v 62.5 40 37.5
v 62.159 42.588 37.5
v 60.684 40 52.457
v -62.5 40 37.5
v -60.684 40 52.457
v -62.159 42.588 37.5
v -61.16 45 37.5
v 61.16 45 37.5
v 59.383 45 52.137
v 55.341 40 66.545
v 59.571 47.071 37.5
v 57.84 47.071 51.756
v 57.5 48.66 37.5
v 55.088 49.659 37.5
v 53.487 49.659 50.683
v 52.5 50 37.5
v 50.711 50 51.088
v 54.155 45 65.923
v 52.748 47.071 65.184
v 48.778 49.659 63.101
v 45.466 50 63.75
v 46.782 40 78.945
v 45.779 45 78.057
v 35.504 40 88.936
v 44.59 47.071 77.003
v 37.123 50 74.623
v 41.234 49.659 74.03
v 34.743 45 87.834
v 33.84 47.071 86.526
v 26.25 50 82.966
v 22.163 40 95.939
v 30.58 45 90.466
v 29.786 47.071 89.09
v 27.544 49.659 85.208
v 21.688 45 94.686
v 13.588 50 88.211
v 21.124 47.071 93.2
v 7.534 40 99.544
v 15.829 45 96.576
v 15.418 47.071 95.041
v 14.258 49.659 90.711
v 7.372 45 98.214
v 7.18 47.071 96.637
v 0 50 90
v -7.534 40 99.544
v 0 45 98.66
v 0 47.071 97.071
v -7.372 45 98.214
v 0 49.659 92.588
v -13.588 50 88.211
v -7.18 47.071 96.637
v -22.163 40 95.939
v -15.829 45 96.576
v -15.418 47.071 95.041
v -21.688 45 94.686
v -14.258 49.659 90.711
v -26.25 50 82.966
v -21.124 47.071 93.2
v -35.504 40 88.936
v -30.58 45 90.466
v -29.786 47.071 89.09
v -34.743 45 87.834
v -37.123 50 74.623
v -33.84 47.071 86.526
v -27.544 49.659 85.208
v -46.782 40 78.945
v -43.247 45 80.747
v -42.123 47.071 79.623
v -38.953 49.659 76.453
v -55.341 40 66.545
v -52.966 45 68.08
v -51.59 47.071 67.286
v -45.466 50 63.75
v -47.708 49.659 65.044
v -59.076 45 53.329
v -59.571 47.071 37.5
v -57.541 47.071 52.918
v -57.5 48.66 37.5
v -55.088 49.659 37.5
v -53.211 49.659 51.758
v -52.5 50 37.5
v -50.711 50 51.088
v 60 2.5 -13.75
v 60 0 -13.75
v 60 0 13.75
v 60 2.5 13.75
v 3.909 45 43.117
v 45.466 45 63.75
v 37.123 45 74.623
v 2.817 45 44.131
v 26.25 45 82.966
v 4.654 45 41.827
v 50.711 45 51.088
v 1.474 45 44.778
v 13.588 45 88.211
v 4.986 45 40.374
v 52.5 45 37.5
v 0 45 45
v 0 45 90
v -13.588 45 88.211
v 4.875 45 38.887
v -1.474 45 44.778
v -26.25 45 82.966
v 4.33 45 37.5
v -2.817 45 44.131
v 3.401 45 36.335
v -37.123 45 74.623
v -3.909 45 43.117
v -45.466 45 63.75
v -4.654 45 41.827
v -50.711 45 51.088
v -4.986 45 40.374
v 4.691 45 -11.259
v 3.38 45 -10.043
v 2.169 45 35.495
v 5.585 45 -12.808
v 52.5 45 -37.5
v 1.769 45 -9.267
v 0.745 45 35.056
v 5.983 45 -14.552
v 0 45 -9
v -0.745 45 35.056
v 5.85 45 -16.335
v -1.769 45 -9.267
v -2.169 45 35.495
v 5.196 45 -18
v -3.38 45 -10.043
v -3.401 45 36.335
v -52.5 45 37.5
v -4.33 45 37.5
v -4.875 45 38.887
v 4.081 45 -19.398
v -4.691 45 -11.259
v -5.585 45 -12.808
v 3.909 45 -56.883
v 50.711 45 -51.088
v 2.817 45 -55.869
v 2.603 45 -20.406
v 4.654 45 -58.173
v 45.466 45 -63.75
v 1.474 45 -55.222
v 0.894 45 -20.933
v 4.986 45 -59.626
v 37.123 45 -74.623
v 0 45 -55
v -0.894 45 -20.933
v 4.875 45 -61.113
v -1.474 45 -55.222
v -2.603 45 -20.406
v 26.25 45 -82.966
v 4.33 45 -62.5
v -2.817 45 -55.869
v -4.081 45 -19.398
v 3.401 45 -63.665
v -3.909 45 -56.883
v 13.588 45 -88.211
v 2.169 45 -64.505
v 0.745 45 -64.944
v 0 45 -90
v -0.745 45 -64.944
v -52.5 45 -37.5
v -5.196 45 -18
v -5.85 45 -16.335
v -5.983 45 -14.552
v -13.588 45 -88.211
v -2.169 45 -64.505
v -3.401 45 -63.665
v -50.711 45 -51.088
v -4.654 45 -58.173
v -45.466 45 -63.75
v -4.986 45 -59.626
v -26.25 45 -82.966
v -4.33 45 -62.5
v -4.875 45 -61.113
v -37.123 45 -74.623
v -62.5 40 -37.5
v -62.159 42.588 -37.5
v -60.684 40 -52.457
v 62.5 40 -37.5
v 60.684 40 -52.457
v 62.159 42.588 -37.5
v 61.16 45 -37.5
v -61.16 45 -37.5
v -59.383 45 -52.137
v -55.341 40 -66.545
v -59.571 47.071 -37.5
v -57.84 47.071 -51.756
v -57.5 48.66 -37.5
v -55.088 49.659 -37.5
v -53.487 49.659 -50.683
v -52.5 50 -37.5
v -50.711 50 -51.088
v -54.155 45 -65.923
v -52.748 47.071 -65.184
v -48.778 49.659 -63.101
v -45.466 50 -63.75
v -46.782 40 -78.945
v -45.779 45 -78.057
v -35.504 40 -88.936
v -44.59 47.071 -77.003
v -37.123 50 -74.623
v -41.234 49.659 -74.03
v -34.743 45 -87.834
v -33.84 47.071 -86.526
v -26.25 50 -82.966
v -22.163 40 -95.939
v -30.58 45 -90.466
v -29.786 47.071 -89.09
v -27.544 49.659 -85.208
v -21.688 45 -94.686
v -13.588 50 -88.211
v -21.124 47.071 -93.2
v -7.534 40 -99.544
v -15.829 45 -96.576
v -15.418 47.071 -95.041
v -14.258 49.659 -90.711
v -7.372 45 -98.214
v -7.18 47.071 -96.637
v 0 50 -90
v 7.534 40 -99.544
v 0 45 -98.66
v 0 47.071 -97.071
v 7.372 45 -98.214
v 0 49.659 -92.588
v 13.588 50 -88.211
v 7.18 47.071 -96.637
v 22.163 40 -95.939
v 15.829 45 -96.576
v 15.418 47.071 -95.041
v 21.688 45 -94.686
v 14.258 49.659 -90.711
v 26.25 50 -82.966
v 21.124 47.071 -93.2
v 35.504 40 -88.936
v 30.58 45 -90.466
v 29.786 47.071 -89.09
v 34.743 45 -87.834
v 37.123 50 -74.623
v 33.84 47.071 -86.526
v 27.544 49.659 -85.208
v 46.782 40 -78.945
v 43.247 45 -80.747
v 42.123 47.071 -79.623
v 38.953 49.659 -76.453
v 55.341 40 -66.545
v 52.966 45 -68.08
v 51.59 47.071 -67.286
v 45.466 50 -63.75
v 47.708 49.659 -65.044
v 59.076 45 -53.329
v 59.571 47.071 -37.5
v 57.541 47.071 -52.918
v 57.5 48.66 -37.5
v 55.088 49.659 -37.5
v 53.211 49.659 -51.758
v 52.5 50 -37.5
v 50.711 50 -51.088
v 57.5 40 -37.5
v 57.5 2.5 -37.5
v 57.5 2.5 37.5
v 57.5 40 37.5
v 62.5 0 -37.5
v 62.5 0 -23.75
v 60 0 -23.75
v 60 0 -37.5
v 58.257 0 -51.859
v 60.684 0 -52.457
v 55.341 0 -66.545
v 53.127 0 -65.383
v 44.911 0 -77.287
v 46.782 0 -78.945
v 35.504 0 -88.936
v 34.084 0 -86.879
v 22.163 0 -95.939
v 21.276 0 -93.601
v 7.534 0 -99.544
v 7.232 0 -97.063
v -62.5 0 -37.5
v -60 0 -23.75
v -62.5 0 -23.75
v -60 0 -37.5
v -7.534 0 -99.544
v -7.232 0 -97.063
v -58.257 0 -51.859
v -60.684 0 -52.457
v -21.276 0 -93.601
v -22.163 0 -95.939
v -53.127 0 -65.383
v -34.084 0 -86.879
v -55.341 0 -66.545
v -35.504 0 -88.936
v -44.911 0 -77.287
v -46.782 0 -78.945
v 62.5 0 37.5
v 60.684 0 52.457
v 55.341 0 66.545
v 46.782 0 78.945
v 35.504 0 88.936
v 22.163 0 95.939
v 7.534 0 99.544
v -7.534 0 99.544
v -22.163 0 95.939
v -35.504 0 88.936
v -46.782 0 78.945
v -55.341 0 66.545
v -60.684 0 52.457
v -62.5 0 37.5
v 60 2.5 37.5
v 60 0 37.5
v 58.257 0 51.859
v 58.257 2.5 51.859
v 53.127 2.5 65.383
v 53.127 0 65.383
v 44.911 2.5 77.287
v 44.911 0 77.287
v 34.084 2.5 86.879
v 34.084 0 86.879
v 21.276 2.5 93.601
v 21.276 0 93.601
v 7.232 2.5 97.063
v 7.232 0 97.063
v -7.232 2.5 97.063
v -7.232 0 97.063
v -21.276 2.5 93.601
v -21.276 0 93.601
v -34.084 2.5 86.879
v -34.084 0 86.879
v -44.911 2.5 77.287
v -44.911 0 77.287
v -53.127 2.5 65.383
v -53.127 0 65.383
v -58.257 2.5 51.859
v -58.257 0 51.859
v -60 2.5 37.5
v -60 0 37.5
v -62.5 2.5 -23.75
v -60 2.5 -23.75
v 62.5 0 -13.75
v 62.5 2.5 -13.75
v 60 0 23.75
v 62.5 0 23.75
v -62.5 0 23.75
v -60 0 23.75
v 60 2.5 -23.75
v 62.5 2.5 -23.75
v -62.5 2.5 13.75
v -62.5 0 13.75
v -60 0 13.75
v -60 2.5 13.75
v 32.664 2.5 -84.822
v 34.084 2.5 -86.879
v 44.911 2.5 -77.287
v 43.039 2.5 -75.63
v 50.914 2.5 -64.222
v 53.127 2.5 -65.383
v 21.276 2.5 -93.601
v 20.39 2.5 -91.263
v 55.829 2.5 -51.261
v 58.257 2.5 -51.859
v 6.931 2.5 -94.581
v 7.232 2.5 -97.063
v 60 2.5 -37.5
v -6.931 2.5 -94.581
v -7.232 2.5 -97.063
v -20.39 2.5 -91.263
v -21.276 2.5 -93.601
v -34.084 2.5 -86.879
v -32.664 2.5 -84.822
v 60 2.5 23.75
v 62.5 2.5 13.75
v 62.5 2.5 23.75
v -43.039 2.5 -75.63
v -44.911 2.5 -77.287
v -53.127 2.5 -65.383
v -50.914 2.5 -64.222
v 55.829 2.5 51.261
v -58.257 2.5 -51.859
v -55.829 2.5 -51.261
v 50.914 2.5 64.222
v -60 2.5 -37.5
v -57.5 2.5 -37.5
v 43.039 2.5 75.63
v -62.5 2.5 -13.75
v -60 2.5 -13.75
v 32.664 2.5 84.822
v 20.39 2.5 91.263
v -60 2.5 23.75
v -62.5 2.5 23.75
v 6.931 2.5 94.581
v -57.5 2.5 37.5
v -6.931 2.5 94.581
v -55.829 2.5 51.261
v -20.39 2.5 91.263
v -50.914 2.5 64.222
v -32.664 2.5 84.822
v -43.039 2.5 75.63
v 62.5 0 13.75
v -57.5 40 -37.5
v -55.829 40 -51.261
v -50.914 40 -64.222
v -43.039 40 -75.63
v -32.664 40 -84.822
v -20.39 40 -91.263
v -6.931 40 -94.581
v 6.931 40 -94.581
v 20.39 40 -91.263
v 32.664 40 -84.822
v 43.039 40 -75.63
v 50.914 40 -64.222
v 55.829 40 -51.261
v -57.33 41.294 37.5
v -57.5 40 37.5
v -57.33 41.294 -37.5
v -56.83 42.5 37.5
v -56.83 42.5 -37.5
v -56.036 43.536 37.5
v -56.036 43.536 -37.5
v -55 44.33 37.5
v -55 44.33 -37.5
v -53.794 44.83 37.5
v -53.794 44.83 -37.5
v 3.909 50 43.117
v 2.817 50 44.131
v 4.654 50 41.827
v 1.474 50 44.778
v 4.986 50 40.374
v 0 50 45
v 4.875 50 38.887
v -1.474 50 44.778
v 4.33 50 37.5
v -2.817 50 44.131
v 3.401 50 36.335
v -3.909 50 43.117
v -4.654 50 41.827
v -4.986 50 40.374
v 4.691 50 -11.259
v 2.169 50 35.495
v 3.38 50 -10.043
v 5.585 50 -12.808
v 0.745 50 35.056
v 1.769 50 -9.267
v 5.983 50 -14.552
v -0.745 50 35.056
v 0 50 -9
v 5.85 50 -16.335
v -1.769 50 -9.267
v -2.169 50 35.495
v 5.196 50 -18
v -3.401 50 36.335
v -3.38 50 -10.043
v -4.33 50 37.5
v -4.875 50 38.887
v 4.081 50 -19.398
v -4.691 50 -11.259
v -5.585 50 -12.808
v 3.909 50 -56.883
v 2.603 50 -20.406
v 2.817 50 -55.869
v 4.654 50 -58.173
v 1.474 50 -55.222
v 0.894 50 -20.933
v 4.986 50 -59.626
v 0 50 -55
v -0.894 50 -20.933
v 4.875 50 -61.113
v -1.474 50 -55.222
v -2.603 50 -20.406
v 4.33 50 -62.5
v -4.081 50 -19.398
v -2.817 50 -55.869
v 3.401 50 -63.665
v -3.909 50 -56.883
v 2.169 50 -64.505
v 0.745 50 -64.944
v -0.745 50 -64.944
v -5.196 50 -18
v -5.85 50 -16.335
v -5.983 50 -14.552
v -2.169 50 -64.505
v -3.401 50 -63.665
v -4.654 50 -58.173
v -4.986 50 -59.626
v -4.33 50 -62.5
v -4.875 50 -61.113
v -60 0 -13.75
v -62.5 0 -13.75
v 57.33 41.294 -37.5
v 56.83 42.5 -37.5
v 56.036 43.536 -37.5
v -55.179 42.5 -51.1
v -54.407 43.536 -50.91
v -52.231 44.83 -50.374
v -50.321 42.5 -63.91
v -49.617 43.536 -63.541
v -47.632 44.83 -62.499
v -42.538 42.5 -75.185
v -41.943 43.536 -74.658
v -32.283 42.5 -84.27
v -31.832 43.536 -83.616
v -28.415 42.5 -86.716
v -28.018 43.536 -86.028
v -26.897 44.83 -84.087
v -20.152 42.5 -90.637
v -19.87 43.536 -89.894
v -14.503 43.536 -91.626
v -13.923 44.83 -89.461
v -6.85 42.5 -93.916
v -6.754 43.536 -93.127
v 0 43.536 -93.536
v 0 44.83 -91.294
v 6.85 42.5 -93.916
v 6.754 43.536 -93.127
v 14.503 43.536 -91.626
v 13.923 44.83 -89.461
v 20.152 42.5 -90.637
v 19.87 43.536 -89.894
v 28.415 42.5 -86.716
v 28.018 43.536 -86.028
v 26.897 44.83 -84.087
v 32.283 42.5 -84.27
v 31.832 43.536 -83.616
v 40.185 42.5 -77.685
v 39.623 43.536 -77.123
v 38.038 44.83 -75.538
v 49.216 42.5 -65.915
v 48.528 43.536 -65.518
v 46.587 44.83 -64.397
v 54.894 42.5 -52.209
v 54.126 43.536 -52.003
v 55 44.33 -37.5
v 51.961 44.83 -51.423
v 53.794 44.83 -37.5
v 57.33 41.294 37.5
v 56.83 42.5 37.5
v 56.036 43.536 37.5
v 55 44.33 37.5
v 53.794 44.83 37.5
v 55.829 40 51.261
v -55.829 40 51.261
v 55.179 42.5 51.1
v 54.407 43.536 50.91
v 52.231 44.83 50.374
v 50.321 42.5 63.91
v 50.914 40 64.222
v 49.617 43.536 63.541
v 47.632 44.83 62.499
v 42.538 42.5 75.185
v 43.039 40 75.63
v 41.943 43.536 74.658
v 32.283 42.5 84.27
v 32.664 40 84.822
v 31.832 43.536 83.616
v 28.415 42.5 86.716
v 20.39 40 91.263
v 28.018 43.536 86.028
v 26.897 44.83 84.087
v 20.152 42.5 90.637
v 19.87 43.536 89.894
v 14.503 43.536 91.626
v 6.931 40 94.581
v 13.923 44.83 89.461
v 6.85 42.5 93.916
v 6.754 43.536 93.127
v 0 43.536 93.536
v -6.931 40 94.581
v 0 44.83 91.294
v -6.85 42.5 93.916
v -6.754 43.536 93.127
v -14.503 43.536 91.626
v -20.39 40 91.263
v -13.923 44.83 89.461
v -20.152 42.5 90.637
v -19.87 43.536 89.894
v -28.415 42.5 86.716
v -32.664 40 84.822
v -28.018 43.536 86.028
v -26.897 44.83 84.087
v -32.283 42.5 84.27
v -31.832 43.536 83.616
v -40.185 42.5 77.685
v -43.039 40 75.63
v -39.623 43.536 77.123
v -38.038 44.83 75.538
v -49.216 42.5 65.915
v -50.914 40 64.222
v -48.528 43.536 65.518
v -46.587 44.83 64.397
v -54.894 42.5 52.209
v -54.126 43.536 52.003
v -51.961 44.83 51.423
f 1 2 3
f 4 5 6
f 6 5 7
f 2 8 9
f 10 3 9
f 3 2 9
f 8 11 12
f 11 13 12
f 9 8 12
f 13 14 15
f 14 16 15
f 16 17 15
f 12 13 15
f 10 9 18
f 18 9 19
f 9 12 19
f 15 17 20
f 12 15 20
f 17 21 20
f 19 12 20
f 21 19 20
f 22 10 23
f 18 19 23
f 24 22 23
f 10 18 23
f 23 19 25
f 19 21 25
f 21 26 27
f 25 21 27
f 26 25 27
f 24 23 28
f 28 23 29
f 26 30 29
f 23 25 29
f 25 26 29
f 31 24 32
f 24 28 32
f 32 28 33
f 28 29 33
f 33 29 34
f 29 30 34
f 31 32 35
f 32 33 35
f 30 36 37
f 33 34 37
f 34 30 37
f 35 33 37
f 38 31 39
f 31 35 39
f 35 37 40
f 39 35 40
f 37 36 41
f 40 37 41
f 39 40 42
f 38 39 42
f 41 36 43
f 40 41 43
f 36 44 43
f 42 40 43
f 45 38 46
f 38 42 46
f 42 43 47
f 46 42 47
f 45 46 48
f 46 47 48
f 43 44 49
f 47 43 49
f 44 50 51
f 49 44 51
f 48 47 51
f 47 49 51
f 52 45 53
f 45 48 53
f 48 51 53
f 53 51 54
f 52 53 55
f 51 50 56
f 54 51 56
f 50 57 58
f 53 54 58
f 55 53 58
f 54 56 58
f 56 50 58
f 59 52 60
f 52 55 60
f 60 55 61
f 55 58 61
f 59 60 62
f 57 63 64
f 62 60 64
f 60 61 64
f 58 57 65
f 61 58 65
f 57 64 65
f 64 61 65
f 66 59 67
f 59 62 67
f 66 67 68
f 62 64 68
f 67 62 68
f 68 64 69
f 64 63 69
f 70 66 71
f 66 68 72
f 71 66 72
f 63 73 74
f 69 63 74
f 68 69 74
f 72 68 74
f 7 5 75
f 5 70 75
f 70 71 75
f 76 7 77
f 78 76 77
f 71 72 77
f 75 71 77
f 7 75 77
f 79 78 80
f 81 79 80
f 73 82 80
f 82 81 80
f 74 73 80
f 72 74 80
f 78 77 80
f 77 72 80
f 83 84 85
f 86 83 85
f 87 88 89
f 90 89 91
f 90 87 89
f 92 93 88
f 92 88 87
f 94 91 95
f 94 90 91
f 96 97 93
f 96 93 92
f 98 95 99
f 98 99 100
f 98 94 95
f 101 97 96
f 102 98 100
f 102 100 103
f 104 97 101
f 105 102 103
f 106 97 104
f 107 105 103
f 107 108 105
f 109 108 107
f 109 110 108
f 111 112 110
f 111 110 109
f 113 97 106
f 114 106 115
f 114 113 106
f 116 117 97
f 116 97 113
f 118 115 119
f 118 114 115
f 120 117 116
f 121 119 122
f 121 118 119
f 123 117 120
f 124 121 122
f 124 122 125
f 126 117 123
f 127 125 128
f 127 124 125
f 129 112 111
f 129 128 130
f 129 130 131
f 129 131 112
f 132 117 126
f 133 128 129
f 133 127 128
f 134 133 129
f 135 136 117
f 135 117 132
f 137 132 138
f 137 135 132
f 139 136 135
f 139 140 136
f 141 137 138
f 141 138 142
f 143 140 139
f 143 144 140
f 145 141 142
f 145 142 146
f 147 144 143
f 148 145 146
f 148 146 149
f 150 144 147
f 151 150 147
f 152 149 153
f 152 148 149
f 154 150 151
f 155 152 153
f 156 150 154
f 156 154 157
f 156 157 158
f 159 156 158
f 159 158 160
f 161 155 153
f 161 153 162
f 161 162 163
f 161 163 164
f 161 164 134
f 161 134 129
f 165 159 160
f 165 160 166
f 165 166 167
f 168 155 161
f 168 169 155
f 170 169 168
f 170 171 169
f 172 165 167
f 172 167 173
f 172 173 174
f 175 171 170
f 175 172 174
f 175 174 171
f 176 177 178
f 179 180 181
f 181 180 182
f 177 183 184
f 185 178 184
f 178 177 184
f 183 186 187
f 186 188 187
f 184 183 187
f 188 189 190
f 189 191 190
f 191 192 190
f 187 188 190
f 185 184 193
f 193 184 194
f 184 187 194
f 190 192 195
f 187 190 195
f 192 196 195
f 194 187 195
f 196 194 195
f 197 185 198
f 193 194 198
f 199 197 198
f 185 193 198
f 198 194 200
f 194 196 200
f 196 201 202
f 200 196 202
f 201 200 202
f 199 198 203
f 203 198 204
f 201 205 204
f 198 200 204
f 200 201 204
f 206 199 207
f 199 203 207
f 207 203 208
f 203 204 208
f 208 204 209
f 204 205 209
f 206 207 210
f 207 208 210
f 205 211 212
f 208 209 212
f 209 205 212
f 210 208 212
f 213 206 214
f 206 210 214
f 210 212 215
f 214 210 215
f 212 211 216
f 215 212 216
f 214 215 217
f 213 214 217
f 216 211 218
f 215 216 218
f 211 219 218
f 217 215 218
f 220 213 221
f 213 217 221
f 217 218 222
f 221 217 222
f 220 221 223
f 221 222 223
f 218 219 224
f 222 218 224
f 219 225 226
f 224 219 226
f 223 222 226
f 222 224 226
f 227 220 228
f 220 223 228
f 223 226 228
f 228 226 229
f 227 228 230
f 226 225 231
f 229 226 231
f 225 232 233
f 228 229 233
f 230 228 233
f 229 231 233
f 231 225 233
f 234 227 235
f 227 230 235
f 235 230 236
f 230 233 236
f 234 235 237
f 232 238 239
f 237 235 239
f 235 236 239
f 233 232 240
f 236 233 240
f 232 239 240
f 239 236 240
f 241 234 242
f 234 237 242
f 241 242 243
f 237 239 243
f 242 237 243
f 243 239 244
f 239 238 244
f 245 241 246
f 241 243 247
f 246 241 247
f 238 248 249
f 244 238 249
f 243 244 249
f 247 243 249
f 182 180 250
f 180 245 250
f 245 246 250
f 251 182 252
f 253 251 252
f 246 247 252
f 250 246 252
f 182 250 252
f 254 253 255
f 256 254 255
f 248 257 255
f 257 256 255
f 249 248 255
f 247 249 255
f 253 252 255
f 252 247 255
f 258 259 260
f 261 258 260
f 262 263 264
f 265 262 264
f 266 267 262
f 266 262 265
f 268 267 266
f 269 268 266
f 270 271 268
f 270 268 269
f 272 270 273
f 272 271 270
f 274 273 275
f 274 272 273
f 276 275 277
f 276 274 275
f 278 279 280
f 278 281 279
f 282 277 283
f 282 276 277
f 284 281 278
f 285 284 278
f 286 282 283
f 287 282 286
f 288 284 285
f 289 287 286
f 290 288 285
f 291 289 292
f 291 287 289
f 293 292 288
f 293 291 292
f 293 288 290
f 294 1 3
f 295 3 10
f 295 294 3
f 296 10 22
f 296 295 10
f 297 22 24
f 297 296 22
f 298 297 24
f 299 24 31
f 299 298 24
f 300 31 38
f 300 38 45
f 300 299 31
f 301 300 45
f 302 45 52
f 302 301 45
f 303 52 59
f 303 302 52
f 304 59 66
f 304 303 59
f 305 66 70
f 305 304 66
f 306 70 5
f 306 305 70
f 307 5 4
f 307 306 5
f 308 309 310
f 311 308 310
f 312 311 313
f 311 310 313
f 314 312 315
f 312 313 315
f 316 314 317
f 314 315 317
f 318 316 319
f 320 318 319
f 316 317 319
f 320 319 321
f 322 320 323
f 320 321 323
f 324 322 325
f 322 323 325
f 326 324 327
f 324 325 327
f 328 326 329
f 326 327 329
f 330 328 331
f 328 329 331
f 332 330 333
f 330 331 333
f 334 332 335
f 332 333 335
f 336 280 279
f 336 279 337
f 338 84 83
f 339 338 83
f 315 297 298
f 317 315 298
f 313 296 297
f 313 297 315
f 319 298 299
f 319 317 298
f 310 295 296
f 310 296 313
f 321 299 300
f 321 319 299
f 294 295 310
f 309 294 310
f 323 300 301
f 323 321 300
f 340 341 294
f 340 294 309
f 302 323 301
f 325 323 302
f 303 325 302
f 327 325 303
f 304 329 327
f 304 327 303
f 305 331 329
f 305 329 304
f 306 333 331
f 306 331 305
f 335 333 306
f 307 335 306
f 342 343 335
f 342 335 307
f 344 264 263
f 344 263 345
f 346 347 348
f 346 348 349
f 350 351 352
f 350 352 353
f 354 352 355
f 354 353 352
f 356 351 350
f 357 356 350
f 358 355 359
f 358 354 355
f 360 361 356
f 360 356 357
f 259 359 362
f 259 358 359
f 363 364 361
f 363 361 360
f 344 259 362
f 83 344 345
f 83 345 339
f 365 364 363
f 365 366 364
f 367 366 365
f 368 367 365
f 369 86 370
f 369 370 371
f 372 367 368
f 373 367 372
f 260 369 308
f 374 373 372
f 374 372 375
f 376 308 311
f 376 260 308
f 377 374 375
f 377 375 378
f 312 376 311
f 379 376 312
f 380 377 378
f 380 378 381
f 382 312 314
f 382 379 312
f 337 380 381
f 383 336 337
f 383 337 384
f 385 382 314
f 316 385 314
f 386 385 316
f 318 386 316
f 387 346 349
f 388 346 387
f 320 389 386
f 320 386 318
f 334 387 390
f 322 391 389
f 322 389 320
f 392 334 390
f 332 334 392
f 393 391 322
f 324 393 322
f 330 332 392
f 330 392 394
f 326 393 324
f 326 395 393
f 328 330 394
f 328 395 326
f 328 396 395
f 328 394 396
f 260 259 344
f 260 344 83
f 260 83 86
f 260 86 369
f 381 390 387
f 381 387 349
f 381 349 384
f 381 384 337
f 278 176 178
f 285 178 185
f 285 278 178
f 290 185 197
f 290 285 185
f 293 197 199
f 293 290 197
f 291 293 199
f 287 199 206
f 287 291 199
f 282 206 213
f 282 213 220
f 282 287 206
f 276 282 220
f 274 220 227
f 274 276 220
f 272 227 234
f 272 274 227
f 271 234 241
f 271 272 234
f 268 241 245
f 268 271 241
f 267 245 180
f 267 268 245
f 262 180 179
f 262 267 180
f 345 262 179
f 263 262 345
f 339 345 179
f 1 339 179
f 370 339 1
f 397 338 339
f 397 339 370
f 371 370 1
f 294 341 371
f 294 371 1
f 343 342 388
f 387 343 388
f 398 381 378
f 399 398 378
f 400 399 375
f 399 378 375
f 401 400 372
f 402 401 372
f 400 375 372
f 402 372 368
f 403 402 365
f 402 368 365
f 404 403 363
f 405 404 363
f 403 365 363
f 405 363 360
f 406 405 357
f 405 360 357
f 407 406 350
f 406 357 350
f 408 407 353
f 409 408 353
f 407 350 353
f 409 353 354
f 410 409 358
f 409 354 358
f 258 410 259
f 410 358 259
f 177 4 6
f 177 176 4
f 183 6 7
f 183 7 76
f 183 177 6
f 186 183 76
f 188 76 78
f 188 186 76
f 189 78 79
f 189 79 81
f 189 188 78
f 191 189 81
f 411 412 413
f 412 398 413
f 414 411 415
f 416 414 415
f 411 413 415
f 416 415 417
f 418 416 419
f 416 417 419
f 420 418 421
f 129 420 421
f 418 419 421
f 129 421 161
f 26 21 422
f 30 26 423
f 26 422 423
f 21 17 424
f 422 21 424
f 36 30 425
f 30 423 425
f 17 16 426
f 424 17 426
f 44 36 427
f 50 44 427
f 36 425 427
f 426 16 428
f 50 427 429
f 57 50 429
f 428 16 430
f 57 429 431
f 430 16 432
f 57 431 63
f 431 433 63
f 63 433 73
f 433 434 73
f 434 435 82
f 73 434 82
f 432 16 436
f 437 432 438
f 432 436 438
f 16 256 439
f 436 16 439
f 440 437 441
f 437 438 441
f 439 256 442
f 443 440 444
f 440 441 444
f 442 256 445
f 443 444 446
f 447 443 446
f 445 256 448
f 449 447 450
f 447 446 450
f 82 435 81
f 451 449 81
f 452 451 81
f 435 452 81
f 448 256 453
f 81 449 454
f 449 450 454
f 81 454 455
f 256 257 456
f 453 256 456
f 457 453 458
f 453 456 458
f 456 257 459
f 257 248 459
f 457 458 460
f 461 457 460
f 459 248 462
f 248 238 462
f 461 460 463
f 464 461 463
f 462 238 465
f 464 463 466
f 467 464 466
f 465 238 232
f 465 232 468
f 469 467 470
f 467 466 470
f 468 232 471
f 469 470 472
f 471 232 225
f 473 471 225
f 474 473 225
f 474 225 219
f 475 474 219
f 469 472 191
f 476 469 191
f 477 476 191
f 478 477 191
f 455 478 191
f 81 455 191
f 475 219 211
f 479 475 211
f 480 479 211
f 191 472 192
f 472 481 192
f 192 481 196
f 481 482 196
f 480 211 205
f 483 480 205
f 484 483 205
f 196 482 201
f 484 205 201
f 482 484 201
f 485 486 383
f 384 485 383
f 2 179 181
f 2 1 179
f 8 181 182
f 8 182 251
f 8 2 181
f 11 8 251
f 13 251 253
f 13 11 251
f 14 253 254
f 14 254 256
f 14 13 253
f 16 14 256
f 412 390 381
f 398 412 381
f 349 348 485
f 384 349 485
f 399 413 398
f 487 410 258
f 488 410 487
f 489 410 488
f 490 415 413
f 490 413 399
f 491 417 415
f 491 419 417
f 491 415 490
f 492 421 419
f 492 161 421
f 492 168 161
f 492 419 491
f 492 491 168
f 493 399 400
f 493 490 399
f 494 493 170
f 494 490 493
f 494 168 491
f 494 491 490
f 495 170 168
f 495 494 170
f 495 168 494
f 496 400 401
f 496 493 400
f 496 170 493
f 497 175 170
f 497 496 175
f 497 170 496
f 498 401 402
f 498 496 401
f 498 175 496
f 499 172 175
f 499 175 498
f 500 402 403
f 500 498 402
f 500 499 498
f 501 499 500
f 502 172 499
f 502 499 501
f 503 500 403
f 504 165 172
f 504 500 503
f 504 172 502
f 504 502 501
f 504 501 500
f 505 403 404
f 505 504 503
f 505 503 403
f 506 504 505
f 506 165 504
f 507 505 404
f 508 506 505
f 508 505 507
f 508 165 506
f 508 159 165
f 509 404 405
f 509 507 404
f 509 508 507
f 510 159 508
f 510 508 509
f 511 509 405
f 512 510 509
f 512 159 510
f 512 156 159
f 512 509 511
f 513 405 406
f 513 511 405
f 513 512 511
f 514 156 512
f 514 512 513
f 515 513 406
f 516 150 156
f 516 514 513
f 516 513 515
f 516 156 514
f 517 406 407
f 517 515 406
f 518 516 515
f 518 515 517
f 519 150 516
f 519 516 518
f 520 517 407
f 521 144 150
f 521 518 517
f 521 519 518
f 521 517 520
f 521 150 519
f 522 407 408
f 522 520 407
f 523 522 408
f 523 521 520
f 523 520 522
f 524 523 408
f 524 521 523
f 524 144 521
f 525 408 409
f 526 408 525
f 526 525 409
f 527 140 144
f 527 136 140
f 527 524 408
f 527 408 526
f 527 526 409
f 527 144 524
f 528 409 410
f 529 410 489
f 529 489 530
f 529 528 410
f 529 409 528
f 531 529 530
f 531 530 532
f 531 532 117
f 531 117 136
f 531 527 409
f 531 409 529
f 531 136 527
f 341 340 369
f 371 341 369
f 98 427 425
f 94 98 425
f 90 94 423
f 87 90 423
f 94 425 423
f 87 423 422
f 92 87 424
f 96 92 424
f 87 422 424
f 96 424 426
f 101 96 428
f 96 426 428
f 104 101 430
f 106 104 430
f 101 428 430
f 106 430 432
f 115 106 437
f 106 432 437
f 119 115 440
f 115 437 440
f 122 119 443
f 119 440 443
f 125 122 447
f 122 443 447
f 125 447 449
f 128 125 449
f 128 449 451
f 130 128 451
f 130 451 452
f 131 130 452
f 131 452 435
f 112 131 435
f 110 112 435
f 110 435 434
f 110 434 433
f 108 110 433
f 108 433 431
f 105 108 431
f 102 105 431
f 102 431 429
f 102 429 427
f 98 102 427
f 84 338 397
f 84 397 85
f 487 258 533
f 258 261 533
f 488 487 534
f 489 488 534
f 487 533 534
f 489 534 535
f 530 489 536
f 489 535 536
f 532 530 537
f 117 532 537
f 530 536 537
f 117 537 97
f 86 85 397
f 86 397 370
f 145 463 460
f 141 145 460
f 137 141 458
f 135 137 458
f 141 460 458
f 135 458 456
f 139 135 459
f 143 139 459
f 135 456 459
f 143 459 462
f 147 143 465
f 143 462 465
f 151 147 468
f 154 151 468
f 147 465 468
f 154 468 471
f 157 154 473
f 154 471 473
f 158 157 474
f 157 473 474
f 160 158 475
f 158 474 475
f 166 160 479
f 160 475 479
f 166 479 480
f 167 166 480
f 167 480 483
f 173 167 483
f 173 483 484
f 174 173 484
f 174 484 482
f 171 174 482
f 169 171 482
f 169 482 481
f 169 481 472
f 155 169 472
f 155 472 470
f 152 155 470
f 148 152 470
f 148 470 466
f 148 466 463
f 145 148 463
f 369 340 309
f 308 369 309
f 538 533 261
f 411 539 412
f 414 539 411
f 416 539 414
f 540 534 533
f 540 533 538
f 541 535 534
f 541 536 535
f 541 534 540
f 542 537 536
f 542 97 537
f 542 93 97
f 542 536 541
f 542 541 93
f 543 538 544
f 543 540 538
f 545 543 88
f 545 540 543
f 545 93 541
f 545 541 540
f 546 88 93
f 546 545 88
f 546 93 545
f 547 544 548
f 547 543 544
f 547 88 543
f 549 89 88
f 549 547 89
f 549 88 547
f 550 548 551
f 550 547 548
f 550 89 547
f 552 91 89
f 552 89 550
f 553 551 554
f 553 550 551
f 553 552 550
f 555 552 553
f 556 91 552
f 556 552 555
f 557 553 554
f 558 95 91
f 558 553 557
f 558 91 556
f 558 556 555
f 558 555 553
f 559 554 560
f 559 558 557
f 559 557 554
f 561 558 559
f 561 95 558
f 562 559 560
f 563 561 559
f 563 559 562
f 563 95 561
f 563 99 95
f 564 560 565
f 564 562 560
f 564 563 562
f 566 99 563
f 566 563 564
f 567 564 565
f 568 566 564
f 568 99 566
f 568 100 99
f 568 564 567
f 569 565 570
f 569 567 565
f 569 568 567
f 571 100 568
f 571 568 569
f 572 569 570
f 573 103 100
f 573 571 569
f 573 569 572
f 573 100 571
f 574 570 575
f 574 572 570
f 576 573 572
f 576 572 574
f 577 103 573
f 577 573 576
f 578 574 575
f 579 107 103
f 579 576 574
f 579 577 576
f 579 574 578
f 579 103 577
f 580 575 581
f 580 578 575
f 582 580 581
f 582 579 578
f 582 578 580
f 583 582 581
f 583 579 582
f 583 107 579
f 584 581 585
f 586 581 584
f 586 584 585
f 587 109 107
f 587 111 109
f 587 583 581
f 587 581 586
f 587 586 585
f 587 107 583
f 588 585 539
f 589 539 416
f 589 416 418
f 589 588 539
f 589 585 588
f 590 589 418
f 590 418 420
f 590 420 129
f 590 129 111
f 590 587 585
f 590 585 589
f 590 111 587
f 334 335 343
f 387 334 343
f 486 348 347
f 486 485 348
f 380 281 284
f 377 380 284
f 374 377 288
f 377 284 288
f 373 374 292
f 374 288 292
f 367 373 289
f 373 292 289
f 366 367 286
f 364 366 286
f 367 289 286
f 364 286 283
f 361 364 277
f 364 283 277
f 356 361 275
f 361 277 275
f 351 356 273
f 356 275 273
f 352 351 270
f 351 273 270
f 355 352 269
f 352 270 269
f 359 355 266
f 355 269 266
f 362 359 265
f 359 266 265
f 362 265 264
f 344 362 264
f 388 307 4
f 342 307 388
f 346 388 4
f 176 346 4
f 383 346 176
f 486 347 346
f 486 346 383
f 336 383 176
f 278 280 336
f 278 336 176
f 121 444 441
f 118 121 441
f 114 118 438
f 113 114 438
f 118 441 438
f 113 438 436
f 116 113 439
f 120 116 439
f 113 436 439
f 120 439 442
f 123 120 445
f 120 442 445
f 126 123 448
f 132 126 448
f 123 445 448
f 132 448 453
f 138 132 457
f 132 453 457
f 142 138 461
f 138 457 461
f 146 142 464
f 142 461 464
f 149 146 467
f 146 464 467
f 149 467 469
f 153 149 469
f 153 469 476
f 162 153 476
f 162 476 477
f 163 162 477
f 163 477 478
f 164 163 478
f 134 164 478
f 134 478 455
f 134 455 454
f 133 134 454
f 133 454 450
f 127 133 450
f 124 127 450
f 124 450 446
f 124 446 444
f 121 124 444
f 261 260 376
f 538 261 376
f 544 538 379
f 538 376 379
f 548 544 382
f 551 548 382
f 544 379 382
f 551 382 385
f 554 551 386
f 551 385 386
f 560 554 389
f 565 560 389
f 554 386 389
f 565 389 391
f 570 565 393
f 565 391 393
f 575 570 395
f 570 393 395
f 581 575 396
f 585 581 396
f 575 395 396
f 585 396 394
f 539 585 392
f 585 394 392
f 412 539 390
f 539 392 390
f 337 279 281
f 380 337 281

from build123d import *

# Parameters (mm, degrees)
BOSS_EXTRUDE1_DEPTH = 50
FILLET1_R           = 10
SHELL1_T            = -5
CUT_EXTRUDE2_DEPTH  = 2.5
SKETCH5_W           = 10
SKETCH5_H           = 2.5
CUT_EXTRUDE3_DEPTH  = 168.705098402
CUT_EXTRUDE4_REACH  = 130.087
SKETCH6_R           = 5
SKETCH6_R_2         = 6


with BuildPart() as part:
    # Sketch3 → Boss-Extrude1 (new body)
    with BuildSketch(Plane(origin=(0, 0, 0), x_dir=(1, 0, 0), z_dir=(0, 1, 0))):
        with BuildLine():
            Line((-62.5, -37.5), (-62.5, 37.5))
            ThreePointArc((-62.5, 37.5), (0, 100), (62.5, 37.5))
            Line((62.5, 37.5), (62.5, -37.5))
            ThreePointArc((62.5, -37.5), (0, -100), (-62.5, -37.5))
        make_face()
    extrude(amount=BOSS_EXTRUDE1_DEPTH)

    # Fillet1
    fillet1_edges = [part.edges().sort_by_distance(p)[0] for p in [
        (0, 50, 100),
        (62.5, 50, 0),
        (0, 50, -100),
        (-62.5, 50, 0),
    ]]
    fillet(fillet1_edges, radius=FILLET1_R)

    # Shell1
    shell1_openings = [part.faces().sort_by_distance(p)[0] for p in [
        (0, 0, 0),
    ]]
    offset(amount=SHELL1_T, openings=shell1_openings, kind=Kind.INTERSECTION)

    # Sketch4 → Cut-Extrude2 (cut)
    with BuildSketch(Plane.XZ):
        with BuildLine():
            Line((-60, 37.5), (-60, -37.5))
            ThreePointArc((-60, -37.5), (0, -97.5), (60, -37.5))
            Line((60, -37.5), (60, 37.5))
            ThreePointArc((60, 37.5), (0, 97.5), (-60, 37.5))
        make_face()
    extrude(amount=-CUT_EXTRUDE2_DEPTH, mode=Mode.SUBTRACT)

    # Sketch5 → Cut-Extrude3 (cut, through all)
    with BuildSketch(Plane.ZY.offset(62.5)):
        with Locations((-18.75, 1.25)):
            Rectangle(SKETCH5_W, SKETCH5_H)
        with Locations((18.75, 1.25)):
            Rectangle(SKETCH5_W, SKETCH5_H)
    extrude(amount=-CUT_EXTRUDE3_DEPTH, mode=Mode.SUBTRACT)

    # Sketch6 → Cut-Extrude4 (cut, up to next)
    with BuildSketch(Plane(origin=(0, 50, 0), x_dir=(1, 0, 0), z_dir=(0, 1, 0)), mode=Mode.PRIVATE) as cut_extrude4_sk1:
        with Locations(Location((0, 60, 0), (0, 0, 270))):
            Circle(SKETCH6_R)
    cut_extrude4_tool1 = extrude(cut_extrude4_sk1.sketch, amount=-CUT_EXTRUDE4_REACH, mode=Mode.PRIVATE) & part.part
    # Sketch6 → Cut-Extrude4 (cut, up to next)
    with BuildSketch(Plane(origin=(0, 50, 0), x_dir=(1, 0, 0), z_dir=(0, 1, 0)), mode=Mode.PRIVATE) as cut_extrude4_sk2:
        with Locations(Location((0, 15, 0), (0, 0, 270))):
            Circle(SKETCH6_R_2)
    cut_extrude4_tool2 = extrude(cut_extrude4_sk2.sketch, amount=-CUT_EXTRUDE4_REACH, mode=Mode.PRIVATE) & part.part
    # Sketch6 → Cut-Extrude4 (cut, up to next)
    with BuildSketch(Plane(origin=(0, 50, 0), x_dir=(1, 0, 0), z_dir=(0, 1, 0)), mode=Mode.PRIVATE) as cut_extrude4_sk3:
        with Locations(Location((0, -40, 0), (0, 0, 270))):
            Circle(SKETCH6_R)
    cut_extrude4_tool3 = extrude(cut_extrude4_sk3.sketch, amount=-CUT_EXTRUDE4_REACH, mode=Mode.PRIVATE) & part.part
    add(cut_extrude4_tool1.solids().sort_by_distance((0, 50, -60))[0], mode=Mode.SUBTRACT)
    add(cut_extrude4_tool2.solids().sort_by_distance((0, 50, -15))[0], mode=Mode.SUBTRACT)
    add(cut_extrude4_tool3.solids().sort_by_distance((0, 50, 40))[0], mode=Mode.SUBTRACT)


solid = part.part
